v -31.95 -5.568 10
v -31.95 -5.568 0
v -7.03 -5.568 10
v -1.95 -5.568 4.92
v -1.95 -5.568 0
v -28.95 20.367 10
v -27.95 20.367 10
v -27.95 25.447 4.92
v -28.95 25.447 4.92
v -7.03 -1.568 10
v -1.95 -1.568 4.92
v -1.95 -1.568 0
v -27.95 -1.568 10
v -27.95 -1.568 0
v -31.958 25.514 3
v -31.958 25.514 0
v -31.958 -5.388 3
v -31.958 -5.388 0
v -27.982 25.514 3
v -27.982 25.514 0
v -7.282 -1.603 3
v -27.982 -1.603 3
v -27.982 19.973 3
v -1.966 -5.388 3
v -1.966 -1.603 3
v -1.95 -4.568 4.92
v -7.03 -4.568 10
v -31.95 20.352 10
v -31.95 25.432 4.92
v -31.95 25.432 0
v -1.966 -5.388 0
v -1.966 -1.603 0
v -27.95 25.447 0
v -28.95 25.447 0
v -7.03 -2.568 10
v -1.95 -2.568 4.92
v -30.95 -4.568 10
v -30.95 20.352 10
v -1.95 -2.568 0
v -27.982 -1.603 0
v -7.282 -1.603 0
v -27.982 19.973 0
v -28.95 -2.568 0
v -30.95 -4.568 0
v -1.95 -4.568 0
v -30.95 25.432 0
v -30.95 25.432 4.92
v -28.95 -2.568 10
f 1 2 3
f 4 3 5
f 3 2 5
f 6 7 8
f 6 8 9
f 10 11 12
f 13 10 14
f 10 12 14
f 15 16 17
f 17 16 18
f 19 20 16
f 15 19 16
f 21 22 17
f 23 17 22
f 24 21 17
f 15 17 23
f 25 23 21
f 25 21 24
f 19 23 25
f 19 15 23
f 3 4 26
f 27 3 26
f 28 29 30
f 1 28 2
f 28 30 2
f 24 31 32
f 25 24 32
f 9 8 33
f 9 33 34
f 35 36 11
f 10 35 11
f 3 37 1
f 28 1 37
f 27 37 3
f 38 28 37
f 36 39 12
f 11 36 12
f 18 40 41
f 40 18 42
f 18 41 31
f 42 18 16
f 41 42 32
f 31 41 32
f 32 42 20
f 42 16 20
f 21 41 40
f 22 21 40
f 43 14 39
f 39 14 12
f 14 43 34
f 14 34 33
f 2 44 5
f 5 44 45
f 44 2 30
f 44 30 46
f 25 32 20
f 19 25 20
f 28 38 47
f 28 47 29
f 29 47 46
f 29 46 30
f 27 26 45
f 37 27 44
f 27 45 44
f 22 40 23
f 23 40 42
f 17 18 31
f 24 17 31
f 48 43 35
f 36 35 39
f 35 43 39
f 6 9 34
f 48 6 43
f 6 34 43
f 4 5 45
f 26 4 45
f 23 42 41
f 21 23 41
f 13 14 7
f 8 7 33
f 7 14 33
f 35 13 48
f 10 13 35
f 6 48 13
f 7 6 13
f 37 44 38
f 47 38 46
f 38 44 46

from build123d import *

# Parameters (mm, degrees)
F1_DEPTH = 10
F3_DEPTH = 3
F4_SIZE  = 5.08
F5_SIZE  = 5.08
F6_SIZE  = 5.08


with BuildPart() as f1:
    # F0 (on Top) → F1 (new body)
    with BuildSketch(Plane.XY):
        Polygon((-30.949821, -4.568158), (-30.949821, 25.431842), (-31.949821, 25.431842), (-31.949821, -4.568158), (-31.949821, -5.568158), (-1.949821, -5.568158), (-1.949821, -4.568158), align=None)
        Polygon((-27.949821, 25.446974), (-28.949821, 25.446974), (-28.949821, -2.568158), (-27.949821, -2.568158), (-1.949821, -2.568158), (-1.949821, -1.568158), (-27.949821, -1.568158), align=None)
    extrude(amount=F1_DEPTH)

    # F4
    f4_edges = [f1.edges().sort_by_distance(p)[0] for p in [
        (-31.449821, 25.431842, 10),
    ]]
    chamfer(f4_edges, length=F4_SIZE)

    # F5
    f5_edges = [f1.edges().sort_by_distance(p)[0] for p in [
        (-28.449821, 25.446974, 10),
    ]]
    chamfer(f5_edges, length=F5_SIZE)

    # F6
    f6_edges = [f1.edges().sort_by_distance(p)[0] for p in [
        (-1.949821, -2.068158, 10),
        (-1.949821, -5.068158, 10),
    ]]
    chamfer(f6_edges, length=F6_SIZE)


with BuildPart() as f3:
    # F2 (on Top) → F3 (new body)
    with BuildSketch(Plane.XY):
        Polygon((-27.981613, 25.51401), (-31.958159, 25.51401), (-31.958159, -5.388055), (-27.981613, -5.388055), (-27.981613, -1.603151), (-27.981613, 19.972878), align=None)
        Polygon((-1.966384, -1.603151), (-27.981613, 25.51401), (-27.981613, 19.972878), (-7.282347, -1.603151), align=None)
        Polygon((-1.966384, -5.388055), (-1.966384, -1.603151), (-7.282347, -1.603151), (-27.981613, -1.603151), (-27.981613, -5.388055), align=None)
    extrude(amount=F3_DEPTH)


solid = Compound([f1.part, f3.part])
